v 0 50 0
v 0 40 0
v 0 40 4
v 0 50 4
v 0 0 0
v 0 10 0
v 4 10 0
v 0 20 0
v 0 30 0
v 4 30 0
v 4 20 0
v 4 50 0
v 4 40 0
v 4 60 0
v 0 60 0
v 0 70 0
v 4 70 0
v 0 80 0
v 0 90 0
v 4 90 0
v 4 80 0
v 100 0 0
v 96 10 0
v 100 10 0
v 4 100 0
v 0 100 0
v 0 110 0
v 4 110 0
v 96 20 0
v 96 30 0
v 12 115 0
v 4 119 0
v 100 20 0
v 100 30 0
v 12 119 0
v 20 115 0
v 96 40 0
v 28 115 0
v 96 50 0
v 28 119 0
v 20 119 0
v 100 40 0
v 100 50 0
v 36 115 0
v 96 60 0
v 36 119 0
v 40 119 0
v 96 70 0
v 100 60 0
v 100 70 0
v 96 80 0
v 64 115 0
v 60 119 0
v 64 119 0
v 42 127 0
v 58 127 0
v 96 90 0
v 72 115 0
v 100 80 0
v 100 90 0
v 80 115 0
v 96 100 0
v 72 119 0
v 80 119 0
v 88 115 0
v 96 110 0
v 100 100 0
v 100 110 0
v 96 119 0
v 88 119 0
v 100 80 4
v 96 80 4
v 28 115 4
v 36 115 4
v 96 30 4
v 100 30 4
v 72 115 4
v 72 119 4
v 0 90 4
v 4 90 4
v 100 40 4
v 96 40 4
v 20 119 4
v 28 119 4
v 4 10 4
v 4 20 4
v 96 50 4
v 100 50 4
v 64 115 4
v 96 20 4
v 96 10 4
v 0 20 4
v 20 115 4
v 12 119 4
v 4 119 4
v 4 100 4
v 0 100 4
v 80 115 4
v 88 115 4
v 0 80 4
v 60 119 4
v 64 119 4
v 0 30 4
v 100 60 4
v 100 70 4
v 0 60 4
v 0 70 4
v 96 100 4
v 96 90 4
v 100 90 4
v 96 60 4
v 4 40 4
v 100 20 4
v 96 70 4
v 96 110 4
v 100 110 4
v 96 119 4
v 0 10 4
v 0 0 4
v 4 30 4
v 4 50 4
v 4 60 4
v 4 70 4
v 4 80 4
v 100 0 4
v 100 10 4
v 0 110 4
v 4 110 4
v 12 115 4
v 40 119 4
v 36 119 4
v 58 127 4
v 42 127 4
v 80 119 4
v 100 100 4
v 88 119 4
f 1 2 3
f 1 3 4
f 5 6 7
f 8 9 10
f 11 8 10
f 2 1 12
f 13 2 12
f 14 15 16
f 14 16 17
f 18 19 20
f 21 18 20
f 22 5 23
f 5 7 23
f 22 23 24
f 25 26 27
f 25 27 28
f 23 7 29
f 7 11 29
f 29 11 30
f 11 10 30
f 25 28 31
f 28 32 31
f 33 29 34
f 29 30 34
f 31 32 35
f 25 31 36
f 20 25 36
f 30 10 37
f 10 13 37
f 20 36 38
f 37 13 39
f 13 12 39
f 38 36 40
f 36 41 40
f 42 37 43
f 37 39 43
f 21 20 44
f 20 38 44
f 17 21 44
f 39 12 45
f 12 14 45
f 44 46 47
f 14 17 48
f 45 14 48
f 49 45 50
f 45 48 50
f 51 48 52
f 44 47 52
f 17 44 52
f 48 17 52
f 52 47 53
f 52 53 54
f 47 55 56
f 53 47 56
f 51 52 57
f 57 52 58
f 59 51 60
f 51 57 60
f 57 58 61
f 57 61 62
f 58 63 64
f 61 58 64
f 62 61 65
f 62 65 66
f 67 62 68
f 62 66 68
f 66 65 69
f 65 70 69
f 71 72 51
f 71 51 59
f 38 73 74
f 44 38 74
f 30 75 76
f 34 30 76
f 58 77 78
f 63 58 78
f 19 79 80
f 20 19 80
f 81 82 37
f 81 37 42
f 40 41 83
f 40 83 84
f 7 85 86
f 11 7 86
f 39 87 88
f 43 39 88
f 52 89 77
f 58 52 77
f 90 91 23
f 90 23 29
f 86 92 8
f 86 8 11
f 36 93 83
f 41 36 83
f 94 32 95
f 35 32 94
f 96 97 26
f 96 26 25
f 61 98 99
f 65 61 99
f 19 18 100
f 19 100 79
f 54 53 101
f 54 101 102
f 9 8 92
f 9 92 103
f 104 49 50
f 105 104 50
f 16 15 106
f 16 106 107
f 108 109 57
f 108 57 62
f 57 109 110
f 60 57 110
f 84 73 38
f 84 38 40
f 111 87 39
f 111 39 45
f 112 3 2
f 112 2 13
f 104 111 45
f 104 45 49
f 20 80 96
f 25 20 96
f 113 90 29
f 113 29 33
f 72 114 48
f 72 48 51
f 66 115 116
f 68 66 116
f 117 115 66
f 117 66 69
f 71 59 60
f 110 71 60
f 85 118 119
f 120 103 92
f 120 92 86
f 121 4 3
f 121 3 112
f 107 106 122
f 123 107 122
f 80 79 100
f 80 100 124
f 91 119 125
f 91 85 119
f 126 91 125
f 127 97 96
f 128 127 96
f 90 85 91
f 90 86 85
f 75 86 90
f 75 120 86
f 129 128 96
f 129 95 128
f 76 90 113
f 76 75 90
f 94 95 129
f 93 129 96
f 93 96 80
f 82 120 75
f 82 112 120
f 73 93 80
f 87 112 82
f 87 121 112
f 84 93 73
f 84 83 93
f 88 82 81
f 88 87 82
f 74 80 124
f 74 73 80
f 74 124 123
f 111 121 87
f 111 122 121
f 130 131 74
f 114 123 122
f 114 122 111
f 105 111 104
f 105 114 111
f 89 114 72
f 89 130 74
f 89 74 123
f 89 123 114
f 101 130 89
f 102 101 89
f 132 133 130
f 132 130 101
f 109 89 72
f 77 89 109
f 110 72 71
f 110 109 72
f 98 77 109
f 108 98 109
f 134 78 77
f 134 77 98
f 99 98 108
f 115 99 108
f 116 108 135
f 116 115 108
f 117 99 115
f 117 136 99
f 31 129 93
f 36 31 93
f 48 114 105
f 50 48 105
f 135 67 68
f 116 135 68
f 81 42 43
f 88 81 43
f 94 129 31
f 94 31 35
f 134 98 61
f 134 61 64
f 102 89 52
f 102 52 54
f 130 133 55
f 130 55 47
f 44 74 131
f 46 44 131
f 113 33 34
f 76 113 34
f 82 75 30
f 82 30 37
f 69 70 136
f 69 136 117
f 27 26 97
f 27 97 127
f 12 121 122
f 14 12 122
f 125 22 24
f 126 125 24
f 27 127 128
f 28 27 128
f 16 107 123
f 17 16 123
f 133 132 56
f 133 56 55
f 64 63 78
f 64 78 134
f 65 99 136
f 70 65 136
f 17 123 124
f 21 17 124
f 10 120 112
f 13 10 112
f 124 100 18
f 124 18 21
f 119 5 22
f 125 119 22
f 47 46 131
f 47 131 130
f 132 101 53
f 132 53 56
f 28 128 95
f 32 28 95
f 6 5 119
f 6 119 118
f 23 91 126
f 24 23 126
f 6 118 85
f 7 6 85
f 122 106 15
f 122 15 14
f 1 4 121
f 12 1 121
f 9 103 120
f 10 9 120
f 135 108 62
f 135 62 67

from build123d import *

# Parameters (mm, degrees)
F0_W     = 100
F0_H     = 119
F1_DEPTH = 4
F2_W     = 4
F2_H     = 10
F2_W_2   = 8
F2_H_2   = 4
F3_DEPTH = 4.001
F5_DEPTH = 4


with BuildPart() as f1:
    # F0 (on Top) → F1 (new body)
    with BuildSketch(Plane.XY):
        with Locations((50, 59.5)):
            Rectangle(F0_W, F0_H)
    extrude(amount=F1_DEPTH)

    # F2 (on face) → F3 (cut, through all)
    with BuildSketch(Plane.XY.offset(4)):
        with Locations((98, 15)):
            Rectangle(F2_W, F2_H)
        with Locations((98, 35)):
            Rectangle(F2_W, F2_H)
        with Locations((98, 55)):
            Rectangle(F2_W, F2_H)
        with Locations((98, 75)):
            Rectangle(F2_W, F2_H)
        with Locations((98, 95)):
            Rectangle(F2_W, F2_H)
        with Locations((98, 115)):
            Rectangle(F2_W, F2_H)
        with Locations((2, 15)):
            Rectangle(F2_W, F2_H)
        with Locations((2, 35)):
            Rectangle(F2_W, F2_H)
        with Locations((2, 55)):
            Rectangle(F2_W, F2_H)
        with Locations((2, 75)):
            Rectangle(F2_W, F2_H)
        with Locations((2, 95)):
            Rectangle(F2_W, F2_H)
        with Locations((2, 115)):
            Rectangle(F2_W, F2_H)
        with Locations((16, 117)):
            Rectangle(F2_W_2, F2_H_2)
        with Locations((32, 117)):
            Rectangle(F2_W_2, F2_H_2)
        with Locations((84, 117)):
            Rectangle(F2_W_2, F2_H_2)
        with Locations((68, 117)):
            Rectangle(F2_W_2, F2_H_2)
    extrude(amount=-F3_DEPTH, mode=Mode.SUBTRACT)

    # F4 (on face) → F5 (join)
    with BuildSketch(Plane.XY.offset(4)):
        Polygon((42, 127), (40, 119), (60, 119), (58, 127), align=None)
    extrude(amount=-F5_DEPTH)


solid = f1.part
